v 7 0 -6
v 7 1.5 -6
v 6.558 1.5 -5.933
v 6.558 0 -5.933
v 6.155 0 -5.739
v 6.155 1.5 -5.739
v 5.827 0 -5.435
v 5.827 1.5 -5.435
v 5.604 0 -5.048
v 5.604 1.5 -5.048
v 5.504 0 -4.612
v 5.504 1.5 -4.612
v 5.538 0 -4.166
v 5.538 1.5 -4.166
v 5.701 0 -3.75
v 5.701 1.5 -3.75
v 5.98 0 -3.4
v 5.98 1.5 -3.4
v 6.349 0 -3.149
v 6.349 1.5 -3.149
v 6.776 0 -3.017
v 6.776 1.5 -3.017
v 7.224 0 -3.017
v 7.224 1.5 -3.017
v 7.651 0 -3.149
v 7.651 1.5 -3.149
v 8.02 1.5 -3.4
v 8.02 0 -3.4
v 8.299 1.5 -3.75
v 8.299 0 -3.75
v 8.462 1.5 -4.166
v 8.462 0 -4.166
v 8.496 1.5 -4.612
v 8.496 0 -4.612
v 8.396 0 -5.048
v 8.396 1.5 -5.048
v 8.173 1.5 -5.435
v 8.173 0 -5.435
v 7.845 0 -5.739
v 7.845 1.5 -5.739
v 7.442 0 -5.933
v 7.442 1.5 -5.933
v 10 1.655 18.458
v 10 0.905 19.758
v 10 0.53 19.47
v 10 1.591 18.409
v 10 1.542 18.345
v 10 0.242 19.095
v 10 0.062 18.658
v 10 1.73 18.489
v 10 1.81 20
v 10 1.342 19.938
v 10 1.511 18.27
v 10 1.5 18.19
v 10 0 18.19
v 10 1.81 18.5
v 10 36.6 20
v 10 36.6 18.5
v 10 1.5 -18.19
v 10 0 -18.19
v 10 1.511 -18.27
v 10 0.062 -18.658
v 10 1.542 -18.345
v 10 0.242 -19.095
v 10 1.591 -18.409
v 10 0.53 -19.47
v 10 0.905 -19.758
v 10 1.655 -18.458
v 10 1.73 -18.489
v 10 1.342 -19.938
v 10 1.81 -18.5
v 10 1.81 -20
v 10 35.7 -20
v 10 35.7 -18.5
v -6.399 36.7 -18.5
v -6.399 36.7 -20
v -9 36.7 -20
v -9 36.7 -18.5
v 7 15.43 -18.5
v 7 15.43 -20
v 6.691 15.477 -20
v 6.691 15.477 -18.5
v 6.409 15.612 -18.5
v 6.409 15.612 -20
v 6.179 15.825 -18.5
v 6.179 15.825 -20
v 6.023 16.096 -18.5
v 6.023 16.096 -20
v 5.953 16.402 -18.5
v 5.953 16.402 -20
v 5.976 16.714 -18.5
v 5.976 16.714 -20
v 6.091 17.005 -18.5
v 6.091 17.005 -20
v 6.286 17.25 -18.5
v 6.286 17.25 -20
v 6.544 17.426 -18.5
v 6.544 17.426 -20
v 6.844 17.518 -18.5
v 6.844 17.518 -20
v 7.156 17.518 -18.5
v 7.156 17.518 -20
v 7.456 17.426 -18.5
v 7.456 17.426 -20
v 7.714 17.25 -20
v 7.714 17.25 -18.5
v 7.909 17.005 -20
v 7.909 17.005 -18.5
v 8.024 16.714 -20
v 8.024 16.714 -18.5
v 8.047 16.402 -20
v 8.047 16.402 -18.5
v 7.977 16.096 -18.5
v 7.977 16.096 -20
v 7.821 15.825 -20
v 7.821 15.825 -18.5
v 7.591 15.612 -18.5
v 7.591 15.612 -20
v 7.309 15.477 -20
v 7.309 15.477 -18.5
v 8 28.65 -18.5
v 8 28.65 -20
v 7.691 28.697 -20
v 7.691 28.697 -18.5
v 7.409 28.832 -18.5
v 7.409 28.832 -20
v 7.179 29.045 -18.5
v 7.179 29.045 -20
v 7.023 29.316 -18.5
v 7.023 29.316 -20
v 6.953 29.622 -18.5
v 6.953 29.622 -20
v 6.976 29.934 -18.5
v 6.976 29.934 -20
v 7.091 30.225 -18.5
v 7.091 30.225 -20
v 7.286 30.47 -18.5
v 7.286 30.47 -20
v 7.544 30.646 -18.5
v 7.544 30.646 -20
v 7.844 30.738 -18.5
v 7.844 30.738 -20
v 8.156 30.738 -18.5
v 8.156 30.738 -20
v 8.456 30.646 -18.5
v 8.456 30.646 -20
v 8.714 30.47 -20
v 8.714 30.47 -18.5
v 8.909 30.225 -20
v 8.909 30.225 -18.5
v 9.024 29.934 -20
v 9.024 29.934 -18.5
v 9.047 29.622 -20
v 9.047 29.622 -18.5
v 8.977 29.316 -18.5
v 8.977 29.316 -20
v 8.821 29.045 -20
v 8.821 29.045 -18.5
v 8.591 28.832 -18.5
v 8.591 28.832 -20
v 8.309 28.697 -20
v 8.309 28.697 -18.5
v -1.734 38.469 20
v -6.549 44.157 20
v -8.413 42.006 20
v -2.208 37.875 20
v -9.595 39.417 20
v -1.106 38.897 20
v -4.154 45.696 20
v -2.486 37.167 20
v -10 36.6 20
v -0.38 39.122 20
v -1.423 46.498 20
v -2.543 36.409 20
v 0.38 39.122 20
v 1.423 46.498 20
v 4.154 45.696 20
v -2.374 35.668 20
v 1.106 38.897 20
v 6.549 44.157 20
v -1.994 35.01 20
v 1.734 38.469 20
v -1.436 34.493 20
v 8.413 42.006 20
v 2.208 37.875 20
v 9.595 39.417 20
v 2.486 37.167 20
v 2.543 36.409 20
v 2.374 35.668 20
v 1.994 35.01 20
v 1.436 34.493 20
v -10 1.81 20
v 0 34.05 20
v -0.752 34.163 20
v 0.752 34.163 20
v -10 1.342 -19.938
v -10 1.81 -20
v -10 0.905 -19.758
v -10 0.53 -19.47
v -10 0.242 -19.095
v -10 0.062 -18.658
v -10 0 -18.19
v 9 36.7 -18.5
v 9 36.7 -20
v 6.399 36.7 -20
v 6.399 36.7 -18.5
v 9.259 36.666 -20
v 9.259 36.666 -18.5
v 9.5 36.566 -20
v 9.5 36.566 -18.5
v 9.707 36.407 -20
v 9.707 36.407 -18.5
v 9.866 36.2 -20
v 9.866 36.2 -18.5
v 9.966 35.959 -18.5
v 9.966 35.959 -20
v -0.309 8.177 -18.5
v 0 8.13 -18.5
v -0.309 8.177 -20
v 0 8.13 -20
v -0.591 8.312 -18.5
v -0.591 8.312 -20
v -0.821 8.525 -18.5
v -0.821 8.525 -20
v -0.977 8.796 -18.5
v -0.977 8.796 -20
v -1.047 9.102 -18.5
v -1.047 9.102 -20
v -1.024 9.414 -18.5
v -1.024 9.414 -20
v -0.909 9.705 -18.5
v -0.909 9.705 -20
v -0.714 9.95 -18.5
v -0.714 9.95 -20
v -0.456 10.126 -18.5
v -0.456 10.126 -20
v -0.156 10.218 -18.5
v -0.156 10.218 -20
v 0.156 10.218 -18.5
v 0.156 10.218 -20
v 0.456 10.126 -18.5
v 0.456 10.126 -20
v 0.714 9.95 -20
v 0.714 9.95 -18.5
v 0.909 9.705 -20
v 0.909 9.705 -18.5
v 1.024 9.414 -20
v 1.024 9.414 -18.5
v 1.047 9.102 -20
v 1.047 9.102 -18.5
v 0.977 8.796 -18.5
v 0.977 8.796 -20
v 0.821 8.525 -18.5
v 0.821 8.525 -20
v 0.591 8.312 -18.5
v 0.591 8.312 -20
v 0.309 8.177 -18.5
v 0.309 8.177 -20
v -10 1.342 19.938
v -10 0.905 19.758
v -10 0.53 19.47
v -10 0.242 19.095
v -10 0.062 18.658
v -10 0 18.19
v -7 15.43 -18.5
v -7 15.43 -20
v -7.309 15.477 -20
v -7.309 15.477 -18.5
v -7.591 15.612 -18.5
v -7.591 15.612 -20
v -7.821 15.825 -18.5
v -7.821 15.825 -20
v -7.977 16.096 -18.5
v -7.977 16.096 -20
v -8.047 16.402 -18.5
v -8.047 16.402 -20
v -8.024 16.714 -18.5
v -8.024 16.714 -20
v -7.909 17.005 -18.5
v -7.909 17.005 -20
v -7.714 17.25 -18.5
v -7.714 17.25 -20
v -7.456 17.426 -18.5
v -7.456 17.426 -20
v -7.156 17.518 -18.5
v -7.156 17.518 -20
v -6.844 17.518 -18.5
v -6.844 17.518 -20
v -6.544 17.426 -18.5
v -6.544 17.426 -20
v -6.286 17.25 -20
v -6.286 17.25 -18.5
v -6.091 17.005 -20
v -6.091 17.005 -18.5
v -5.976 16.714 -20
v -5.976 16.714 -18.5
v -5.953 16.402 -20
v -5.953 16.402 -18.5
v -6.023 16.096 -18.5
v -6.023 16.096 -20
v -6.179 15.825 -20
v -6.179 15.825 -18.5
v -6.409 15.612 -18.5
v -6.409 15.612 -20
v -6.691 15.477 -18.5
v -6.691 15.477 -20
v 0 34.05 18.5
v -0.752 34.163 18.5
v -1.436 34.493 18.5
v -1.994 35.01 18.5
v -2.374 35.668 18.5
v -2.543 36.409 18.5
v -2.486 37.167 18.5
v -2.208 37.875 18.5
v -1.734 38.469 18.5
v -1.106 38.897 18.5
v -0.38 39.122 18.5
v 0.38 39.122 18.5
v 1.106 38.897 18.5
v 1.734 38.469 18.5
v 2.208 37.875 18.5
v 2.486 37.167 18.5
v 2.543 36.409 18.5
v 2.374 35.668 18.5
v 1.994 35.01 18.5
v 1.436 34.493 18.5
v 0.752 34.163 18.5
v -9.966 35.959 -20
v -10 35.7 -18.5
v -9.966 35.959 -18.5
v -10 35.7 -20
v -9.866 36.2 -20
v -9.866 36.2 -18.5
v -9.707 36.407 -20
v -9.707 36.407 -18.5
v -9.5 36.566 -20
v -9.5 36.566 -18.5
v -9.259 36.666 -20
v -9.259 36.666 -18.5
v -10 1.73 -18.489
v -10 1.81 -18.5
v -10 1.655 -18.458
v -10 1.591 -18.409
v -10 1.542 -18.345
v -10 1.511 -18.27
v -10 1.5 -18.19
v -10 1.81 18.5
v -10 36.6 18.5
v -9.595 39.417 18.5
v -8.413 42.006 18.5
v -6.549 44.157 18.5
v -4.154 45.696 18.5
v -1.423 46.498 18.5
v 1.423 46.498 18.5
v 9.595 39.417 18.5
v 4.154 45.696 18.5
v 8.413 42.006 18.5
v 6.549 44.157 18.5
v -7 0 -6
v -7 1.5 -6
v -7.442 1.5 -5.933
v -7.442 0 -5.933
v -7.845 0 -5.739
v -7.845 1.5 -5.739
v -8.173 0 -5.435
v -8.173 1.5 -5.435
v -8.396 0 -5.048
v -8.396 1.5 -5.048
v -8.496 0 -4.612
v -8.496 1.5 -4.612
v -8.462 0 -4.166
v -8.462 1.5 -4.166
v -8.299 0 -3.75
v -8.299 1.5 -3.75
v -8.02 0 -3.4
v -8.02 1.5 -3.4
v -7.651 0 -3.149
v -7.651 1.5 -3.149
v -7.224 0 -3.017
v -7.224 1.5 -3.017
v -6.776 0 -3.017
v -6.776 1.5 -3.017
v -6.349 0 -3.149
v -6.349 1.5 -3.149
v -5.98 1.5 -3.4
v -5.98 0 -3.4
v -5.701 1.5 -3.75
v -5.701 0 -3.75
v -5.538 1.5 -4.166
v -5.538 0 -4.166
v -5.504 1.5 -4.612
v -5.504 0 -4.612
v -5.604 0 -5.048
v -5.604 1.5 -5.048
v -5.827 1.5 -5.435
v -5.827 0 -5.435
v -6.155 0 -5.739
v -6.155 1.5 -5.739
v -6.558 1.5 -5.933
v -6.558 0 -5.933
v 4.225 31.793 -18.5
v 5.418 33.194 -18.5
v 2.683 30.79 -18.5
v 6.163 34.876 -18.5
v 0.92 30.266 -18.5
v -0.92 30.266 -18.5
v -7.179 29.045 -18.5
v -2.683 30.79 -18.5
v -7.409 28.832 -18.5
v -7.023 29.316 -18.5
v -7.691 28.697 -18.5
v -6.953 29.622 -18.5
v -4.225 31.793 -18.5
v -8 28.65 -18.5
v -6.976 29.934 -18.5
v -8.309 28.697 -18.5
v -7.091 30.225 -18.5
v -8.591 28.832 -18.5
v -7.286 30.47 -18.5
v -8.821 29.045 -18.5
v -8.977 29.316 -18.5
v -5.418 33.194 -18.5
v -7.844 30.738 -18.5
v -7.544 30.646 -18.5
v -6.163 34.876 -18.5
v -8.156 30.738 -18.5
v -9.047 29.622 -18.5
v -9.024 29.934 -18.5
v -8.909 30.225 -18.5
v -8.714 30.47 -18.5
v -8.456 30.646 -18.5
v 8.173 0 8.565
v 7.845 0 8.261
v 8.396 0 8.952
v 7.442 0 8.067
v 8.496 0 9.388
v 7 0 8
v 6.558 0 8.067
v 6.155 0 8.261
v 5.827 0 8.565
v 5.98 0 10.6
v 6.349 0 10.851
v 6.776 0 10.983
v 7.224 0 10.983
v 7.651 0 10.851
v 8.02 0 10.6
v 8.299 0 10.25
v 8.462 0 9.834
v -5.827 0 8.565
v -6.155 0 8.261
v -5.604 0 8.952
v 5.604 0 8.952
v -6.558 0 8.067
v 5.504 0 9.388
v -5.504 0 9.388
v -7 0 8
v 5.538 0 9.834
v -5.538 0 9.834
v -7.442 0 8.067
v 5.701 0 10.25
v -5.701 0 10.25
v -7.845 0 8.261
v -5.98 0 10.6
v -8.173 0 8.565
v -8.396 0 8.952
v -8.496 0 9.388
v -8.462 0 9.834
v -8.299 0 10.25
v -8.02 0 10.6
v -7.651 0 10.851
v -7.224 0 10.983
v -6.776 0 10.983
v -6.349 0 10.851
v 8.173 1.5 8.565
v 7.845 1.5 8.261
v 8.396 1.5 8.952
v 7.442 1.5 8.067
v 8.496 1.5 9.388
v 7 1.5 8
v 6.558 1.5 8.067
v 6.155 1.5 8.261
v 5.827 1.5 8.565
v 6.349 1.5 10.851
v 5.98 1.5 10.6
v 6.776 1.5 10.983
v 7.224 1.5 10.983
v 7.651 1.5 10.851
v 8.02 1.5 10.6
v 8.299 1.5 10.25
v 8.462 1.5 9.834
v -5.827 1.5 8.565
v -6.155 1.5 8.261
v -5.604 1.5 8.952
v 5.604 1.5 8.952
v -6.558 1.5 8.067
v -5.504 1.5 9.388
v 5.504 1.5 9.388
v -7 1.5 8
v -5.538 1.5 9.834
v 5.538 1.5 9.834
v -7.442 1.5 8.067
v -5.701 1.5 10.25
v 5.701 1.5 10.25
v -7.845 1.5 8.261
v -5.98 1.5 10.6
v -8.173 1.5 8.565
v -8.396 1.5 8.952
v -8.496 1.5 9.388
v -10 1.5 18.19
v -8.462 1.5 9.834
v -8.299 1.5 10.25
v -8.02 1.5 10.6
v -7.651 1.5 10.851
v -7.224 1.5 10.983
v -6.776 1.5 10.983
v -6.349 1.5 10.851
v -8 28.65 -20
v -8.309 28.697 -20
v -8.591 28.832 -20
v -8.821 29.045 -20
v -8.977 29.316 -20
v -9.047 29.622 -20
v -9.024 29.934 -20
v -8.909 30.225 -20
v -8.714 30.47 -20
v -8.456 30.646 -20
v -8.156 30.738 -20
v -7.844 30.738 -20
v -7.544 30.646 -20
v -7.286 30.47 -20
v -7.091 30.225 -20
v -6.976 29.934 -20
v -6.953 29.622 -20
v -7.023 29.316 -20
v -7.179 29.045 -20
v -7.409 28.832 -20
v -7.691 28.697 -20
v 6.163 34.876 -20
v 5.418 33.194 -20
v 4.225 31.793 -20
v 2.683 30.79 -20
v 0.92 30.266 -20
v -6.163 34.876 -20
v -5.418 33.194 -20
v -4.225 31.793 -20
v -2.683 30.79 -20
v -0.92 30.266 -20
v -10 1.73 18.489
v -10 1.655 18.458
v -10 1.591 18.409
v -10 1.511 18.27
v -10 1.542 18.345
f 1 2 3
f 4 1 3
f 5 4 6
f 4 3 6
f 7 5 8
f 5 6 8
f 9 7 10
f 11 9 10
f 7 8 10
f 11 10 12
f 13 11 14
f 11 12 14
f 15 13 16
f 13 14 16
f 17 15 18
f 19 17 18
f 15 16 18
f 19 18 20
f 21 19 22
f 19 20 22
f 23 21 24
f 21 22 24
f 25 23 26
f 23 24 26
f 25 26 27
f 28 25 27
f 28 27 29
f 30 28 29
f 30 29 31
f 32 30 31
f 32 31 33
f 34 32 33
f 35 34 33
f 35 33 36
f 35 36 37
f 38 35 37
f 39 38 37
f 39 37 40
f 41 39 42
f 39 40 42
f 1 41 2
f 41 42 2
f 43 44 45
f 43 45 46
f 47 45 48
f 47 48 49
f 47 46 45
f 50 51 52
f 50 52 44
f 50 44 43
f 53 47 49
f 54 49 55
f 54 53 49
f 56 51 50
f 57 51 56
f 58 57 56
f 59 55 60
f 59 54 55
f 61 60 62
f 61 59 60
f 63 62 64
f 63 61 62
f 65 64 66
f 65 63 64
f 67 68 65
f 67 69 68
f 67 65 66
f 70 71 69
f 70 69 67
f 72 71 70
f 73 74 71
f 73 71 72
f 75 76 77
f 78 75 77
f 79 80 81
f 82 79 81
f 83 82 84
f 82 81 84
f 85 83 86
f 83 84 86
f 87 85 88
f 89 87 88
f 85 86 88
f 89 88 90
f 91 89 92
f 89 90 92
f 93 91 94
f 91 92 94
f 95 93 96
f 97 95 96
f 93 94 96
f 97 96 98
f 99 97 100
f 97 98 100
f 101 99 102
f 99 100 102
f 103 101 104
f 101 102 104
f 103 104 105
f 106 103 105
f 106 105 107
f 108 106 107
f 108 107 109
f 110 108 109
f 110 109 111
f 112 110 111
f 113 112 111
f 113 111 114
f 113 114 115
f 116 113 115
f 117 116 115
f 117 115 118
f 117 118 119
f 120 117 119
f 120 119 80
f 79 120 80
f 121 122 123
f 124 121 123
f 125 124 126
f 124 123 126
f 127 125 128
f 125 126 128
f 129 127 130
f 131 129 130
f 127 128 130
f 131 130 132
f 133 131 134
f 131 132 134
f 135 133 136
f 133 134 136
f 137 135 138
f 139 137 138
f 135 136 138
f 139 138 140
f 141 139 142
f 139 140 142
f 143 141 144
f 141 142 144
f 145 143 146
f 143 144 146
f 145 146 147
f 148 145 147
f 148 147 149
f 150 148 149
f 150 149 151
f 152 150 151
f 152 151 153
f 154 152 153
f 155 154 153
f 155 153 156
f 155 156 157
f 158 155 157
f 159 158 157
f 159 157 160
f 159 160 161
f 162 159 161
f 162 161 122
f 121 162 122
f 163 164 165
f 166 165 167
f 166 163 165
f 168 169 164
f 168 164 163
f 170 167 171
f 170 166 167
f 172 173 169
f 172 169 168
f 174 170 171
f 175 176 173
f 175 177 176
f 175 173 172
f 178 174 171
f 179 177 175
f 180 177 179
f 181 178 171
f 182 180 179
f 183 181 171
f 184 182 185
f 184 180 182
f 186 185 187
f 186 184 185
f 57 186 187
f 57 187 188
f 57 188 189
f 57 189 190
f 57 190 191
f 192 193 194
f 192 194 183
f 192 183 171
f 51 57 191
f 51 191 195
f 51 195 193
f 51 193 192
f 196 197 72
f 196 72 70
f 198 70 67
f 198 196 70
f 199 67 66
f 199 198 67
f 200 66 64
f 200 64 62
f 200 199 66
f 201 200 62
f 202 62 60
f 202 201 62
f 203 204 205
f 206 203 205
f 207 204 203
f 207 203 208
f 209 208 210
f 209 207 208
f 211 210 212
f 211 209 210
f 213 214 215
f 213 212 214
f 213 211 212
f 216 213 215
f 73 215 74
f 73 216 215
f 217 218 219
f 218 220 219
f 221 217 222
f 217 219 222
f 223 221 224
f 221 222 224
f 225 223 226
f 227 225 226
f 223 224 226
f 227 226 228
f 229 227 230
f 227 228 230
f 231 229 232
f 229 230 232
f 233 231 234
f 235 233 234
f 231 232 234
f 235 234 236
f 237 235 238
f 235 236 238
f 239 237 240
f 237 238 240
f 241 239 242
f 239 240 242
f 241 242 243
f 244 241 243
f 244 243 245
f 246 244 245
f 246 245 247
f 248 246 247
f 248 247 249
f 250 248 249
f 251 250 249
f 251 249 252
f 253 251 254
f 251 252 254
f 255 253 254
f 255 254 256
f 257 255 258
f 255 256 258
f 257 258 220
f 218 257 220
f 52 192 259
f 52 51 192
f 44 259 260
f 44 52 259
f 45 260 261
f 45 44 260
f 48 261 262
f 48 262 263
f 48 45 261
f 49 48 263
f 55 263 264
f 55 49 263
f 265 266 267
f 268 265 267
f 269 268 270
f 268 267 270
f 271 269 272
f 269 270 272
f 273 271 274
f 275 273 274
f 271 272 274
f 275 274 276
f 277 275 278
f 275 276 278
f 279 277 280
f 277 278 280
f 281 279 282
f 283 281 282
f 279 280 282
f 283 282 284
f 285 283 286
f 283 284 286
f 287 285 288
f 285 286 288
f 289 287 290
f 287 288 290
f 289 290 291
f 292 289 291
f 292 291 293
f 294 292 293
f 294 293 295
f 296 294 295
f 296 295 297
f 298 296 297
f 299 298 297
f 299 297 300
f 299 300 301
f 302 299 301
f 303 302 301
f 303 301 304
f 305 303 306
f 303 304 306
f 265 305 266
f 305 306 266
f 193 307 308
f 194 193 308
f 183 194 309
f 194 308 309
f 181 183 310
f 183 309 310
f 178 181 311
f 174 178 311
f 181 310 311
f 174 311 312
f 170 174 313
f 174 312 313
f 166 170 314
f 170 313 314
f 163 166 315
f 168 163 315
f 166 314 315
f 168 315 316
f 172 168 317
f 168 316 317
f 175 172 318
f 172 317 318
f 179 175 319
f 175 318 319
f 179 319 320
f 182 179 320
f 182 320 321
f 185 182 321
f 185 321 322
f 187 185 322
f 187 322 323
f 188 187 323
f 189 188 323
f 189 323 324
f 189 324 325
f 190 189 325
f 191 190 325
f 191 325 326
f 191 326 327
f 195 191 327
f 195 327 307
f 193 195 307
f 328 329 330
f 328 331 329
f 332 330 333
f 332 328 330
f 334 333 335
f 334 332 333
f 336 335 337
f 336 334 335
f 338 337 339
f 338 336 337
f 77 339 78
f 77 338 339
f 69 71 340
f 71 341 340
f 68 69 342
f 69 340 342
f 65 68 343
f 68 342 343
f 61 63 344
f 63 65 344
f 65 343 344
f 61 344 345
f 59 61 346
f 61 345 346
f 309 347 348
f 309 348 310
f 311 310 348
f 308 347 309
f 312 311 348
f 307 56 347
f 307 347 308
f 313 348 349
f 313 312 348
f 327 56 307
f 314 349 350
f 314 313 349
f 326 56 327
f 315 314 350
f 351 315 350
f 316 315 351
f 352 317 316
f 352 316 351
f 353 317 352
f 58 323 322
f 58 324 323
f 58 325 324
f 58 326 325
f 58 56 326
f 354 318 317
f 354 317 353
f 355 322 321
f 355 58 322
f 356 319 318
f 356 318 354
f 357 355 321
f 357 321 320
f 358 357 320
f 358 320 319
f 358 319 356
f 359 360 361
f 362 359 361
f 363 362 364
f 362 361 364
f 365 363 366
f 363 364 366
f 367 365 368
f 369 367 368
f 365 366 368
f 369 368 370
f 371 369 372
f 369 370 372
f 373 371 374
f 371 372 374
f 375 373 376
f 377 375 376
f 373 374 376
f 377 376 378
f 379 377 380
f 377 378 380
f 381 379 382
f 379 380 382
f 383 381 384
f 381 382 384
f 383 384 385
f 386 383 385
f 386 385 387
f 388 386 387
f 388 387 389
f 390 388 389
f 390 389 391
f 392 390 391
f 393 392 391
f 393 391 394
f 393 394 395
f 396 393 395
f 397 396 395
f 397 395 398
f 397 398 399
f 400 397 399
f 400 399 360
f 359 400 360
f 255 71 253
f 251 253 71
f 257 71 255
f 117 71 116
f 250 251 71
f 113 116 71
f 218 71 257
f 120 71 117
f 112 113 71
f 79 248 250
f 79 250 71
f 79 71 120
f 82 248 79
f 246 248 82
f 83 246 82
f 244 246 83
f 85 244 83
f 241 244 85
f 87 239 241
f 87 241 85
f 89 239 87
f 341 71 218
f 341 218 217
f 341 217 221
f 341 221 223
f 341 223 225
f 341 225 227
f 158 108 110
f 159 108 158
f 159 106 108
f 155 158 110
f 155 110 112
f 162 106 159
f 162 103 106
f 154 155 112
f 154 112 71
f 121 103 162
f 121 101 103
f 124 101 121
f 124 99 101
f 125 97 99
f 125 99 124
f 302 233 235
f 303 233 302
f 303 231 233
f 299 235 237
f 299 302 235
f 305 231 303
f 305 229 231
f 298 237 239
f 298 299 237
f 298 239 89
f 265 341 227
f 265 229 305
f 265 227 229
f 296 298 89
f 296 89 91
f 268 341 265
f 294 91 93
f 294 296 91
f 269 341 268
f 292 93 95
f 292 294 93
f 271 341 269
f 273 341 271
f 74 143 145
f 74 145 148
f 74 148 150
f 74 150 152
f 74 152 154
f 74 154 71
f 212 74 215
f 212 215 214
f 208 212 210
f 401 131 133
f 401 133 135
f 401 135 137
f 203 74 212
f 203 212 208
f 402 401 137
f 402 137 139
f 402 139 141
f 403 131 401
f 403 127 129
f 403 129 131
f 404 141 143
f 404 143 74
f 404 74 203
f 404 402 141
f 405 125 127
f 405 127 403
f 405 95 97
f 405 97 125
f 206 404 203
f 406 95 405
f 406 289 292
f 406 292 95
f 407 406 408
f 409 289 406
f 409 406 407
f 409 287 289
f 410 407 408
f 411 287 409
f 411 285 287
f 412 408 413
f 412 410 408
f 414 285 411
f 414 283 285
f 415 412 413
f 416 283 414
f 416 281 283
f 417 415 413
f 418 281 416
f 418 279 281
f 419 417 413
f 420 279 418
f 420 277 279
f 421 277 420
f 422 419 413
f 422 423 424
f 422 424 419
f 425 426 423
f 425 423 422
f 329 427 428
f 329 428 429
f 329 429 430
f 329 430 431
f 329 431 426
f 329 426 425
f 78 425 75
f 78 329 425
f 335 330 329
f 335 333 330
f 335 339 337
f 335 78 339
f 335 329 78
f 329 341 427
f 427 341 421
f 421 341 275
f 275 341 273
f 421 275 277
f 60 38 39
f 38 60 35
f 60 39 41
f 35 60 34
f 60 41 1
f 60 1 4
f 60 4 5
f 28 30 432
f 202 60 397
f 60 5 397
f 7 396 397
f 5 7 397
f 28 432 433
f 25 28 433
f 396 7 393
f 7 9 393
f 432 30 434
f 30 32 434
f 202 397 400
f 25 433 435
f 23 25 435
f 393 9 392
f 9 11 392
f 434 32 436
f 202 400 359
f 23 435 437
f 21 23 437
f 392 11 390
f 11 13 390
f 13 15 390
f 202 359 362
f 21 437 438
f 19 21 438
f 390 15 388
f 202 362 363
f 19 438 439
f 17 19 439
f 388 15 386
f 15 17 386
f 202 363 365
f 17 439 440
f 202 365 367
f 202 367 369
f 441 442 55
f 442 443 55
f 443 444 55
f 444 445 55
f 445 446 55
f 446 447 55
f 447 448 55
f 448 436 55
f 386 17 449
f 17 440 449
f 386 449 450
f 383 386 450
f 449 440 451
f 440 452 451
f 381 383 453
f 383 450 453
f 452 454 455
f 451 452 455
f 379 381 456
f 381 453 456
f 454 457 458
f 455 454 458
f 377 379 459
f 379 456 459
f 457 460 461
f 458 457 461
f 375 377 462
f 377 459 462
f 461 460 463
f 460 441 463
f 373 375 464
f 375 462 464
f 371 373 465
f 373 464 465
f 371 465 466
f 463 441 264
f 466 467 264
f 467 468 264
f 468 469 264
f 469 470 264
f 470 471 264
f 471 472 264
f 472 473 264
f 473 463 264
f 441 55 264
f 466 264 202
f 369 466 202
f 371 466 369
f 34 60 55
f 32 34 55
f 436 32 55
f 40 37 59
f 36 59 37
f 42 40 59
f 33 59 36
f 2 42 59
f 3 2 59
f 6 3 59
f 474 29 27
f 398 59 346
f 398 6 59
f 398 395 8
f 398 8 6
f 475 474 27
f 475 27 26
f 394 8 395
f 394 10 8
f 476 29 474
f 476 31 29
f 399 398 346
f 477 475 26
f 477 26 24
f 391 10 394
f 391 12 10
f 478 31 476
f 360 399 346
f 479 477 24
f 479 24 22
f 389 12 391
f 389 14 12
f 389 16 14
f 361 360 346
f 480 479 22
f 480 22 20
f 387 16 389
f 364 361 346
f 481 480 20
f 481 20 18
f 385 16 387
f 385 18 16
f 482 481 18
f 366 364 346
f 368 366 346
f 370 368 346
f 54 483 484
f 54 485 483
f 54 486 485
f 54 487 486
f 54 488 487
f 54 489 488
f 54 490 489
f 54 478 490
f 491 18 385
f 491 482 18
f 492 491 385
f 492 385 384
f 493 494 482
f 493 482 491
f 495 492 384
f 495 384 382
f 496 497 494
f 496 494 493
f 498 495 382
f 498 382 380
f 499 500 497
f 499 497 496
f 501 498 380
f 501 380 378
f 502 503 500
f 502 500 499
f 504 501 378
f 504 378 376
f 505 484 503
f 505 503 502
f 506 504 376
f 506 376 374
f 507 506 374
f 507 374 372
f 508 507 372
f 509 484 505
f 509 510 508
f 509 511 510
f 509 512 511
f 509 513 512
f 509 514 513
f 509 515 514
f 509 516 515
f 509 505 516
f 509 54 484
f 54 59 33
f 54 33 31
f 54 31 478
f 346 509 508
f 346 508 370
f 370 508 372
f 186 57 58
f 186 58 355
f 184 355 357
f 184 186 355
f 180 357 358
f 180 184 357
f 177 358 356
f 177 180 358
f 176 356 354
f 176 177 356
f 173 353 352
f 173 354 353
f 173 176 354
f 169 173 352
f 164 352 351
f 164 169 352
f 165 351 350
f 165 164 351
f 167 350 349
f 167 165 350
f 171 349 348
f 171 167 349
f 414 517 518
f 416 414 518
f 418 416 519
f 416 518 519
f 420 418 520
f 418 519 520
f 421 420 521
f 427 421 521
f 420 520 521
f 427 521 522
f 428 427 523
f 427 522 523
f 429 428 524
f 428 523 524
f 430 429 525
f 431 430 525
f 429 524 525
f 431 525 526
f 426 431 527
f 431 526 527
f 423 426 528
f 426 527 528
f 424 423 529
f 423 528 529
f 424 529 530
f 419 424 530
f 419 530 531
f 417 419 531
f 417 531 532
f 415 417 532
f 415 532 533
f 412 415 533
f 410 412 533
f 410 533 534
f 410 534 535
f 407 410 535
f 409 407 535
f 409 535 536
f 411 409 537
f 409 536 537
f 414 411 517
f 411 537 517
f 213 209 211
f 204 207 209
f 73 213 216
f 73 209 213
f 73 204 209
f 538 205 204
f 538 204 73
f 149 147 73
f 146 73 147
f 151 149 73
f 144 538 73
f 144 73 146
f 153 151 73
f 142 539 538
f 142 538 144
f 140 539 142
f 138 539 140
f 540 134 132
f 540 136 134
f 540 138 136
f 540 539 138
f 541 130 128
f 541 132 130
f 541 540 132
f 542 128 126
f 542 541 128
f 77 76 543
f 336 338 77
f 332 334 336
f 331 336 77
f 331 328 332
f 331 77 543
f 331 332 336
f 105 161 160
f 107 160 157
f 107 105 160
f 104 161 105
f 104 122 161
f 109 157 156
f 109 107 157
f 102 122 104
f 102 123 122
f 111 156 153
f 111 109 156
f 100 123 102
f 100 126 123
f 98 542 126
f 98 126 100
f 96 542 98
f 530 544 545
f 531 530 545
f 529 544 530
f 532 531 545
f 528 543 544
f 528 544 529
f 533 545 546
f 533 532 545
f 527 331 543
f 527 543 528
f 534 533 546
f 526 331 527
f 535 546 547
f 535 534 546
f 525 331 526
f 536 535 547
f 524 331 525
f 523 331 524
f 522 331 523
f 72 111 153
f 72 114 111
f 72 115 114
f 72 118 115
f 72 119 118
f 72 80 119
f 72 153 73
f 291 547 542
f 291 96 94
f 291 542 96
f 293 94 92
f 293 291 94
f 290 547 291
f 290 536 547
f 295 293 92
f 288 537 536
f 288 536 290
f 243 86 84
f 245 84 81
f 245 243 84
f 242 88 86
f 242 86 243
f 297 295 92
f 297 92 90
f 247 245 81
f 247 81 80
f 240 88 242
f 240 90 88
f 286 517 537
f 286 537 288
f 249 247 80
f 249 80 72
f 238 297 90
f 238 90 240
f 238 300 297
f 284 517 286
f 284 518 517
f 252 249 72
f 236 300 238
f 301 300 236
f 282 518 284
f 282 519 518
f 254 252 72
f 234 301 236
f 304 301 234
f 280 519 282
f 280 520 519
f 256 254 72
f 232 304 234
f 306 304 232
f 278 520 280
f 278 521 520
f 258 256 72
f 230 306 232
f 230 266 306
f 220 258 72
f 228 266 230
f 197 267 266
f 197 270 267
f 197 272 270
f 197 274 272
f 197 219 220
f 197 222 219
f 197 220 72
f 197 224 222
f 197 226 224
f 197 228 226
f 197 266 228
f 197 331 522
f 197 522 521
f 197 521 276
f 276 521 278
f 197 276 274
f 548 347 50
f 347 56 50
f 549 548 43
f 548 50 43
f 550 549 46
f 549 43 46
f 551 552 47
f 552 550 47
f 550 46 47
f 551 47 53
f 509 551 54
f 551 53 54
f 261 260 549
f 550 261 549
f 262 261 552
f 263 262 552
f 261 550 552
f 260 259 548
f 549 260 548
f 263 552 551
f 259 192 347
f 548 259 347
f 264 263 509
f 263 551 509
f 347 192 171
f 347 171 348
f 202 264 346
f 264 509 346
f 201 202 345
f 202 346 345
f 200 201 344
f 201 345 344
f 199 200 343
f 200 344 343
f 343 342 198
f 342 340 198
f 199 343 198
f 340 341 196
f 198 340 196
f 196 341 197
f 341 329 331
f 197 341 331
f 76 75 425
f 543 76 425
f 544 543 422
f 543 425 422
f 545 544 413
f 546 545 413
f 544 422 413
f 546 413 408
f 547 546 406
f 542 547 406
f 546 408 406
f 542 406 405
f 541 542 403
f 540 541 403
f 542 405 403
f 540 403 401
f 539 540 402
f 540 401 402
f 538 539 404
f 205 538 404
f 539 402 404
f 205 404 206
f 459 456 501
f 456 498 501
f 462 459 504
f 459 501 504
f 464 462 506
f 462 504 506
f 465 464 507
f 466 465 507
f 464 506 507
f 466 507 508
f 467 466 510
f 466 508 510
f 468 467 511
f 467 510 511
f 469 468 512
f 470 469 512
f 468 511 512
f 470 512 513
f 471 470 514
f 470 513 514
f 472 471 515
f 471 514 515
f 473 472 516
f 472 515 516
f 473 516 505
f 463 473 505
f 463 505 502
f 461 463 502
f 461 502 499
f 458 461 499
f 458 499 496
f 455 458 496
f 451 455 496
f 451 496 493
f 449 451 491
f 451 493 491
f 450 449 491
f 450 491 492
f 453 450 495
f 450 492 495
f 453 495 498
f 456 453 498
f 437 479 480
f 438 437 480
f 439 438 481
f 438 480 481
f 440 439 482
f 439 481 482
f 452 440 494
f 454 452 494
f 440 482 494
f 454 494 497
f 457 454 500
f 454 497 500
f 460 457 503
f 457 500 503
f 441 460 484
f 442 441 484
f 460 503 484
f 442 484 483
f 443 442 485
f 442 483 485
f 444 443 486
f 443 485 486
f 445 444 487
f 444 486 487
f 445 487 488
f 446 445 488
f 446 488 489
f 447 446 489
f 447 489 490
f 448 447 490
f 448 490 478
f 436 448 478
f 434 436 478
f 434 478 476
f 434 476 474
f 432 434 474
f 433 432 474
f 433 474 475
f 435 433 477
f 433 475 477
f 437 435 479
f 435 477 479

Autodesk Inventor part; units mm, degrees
ref_plane "YZ Plane" through (0, 0, 0) normal (1, 0, 0) x (0, 1, 0)
ref_plane "XZ Plane" through (0, 0, 0) normal (0, 1, 0) x (-1, 0, 0)
ref_plane "XY Plane" through (0, 0, 0) normal (0, 0, 1) x (1, 0, 0)
sketch "Sketch1" plane through (0, 0, 0) normal (0, 1, 0) x (-1, 0, 0)
  line L0 (10, -18.5) -> (-10, -18.5)
  line L1 (-10, -18.5) -> (-10, 18.5)
  line L2 (-10, 18.5) -> (10, 18.5)
  line L3 (10, 18.5) -> (10, -18.5)
  point P0 (0, 0)
  dimension "d0" = 20
  dimension "d1" = 37
  dimension "d2" = 18.5
  dimension "d3" = 10
extrude "Plate1" add sketch "Sketch1" along normal blind 1.5
sketch "Sketch2" plane through (-10, 0, -20) normal (0, 0, 1) x (1, 0, 0)
  line L0 (20, 0) -> (0, 0)
  line L1 (0, 0) -> (0, 46.6)
  line L2 (0, 46.6) -> (20, 46.6)
  line L3 (20, 46.6) -> (20, 0)
edge flange "Flange1" height 46.6 angle 90 thickness 1.5 bend radius 0.31 thickness toward (0, 0, 1) relief tear relief width 1.5 relief depth 0.75 edges at (0, 1.5, -18.5) wall of the first edge with corners at (10, 0, -20) (-10, 0, -20) (-10, 46.6, -20) (10, 46.6, -20)
bend "Bend1"
corner "Corner1"
sketch "Sketch3" plane through (10, 0, 20) normal (0, 0, -1) x (-1, 0, 0)
  line L0 (20, 0) -> (0, 0)
  line L1 (0, 0) -> (0, 46.6)
  line L2 (0, 46.6) -> (20, 46.6)
  line L3 (20, 46.6) -> (20, 0)
edge flange "Flange2" height 46.6 angle 90 thickness 1.5 bend radius 0.31 thickness toward (0, 0, -1) relief tear relief width 1.5 relief depth 0.75 edges at (0, 1.5, 18.5) wall of the first edge with corners at (-10, 0, 20) (10, 0, 20) (10, 46.6, 20) (-10, 46.6, 20)
bend "Bend2"
corner "Corner2"
sketch "Sketch4" plane through (-10, 46.6, 20) normal (0, 0, 1) x (1, 0, 0)
  circle A0 centre (10, -10) radius 10
  line L0 (0, 0) -> (20, 0) projected
  line L1 (0, 0) -> (20, 0)
  line L2 (20, 0) -> (20, -10)
  line L3 (20, -10) -> (0, -10)
  line L4 (0, -10) -> (0, 0)
  line L5 (0, -44.79) -> (0, 0) projected
  point P0 (10, -46.6)
  point P1 (10, -10)
  point P2 (20, 0)
  point P3 (10, 0)
  point P4 (0, -10)
  point P5 (8.5893, 0)
  point P6 (0, -10)
  dimension "d26" = 20
  dimension "d25" = 10
  dimension "d27" = 10
  dimension "d28" = 10
extrude "Extrusion1" cut sketch "Sketch4" against normal blind 10 contours L4 L0 A0 | A0 L0 L2
sketch "Sketch5" plane through (10, 46.6, -20) normal (0, 0, -1) x (-1, 0, 0)
  arc A0 (20, -10) -> (0, -10) centre (10, -10) ccw projected
  point P0 (10, -46.6)
hole "Hole1" at (0, 36.6, -20) direction (0, 0, 1) diameter 12.8 depth 1.5
sketch "Sketch6" plane through (10, 46.6, -20) normal (0, 0, -1) x (-1, 0, 0)
  circle A0 centre (10, -10) radius 6.4 projected
  line L0 (0, 0) -> (20, 0) projected
  line L1 (0, -44.79) -> (0, 0) projected
  line L2 (24, 0) -> (-4, 0)
  line L3 (-4, 0) -> (-4, -9.9)
  line L4 (-4, -9.9) -> (24, -9.9)
  line L5 (24, -9.9) -> (24, 0)
  point P0 (10, -46.6)
  point P1 (20, 0)
  point P2 (6.005, 0)
  point P3 (13.995, 0)
  dimension "d38" = 9.9
  dimension "d39" = 4
  dimension "d40" = 28
extrude "Extrusion2" cut sketch "Sketch6" against normal blind 10 contours L4 A0 | A0 L4 L1 L0 L2 L5 | L4 L3 L2 L1 picked at (9.1972, -6.4205)
fillet "Fillet1" radius 1 2 edges at (-10, 36.7, -19.25) (10, 36.7, -19.25)
sketch "Sketch7" plane through (-10, 1.81, 20) normal (0, 0, 1) x (1, 0, 0)
  arc A0 (20, 34.79) -> (0, 34.79) centre (10, 34.79) ccw projected
  point P0 (10, -1.81)
hole "Hole2" at (0, 36.6, 20) direction (0, 0, -1) diameter 5.1 depth 1.5 clearance for "Hex Head Bolt" size "M5" standard "Ansi Metric M Profile"
sketch "Sketch8" plane through (0, 0, 0) normal (0, -1, 0) x (1, 0, 0)
  line L0 (2.55, 18.5) -> (-2.55, 18.5) projected
  line L1 (-10, 18.5) -> (10, 18.5) projected
  line L2 (10, 18.5) -> (-10, 18.5) projected
  line L3 (10, 18.19) -> (-10, 18.19) projected
  line L4 (-10, -18.19) -> (-10, 18.19) projected
  line L5 (-10, -18.19) -> (10, -18.19) projected
  line L6 (10, 18.19) -> (10, -18.19) projected
  point P0 (0, 0)
  point P1 (7, 9.5)
  point P2 (7, -4.5)
  point P3 (-7, 9.5)
  point P4 (-7, -4.5)
  dimension "d51" = 9
  dimension "d52" = 3
  dimension "d55" = 14
  dimension "d58" = 14
hole "Hole3" at (7, 0, 9.5) at (7, 0, -4.5) at (-7, 0, 9.5) at (-7, 0, -4.5) direction (0, 1, 0) diameter 3 depth 1.5
hole "Hole5" at (-8, 29.7, -18.5) at (8, 29.7, -18.5) at (7, 16.48, -18.5) at (-7, 16.48, -18.5) at (0, 9.18, -18.5) direction (0, 0, -1) diameter 2.1 depth 1.5
equation "\"d36\" = Thickness"
equation "\"d49\" = Thickness"
equation "\"d66\" = Thickness"
equation "\"d80\" = Thickness"
equation "\"d4\" = Thickness"
equation "\"d5\" = BendReliefWidth"
equation "\"d6\" = BendReliefDepth"
equation "\"d7\" = MinimumRemnant"
equation "\"d8\" = TransitionRadius"
equation "\"d11\" = BendRadius"
equation "\"d12\" = CornerReliefSize"
equation "\"d13\" = GapSize"
equation "\"d14\" = JacobiRadiusSize"
equation "\"d15\" = BendReliefWidth"
equation "\"d16\" = BendReliefDepth"
equation "\"d17\" = MinimumRemnant"
equation "\"d18\" = TransitionRadius"
equation "\"d21\" = BendRadius"
equation "\"d22\" = CornerReliefSize"
equation "\"d23\" = GapSize"
equation "\"d24\" = JacobiRadiusSize"
equation "\"BendReliefWidth\" = Thickness"
equation "\"BendReliefDepth\" = 0.5 * Thickness"
equation "\"CornerReliefSize\" = 4 * Thickness"
equation "\"MinimumRemnant\" = 2 * Thickness"
equation "\"TransitionRadius\" = BendRadius"
equation "\"JacobiRadiusSize\" = BendRadius"
equation "\"GapSize\" = Thickness"
equation "\"Thickness\" = 1.5"
equation "\"BendRadius\" = 0.31"
properties part number "axis_9_bottom_frame" material "Aluminum 6061-AHC"
